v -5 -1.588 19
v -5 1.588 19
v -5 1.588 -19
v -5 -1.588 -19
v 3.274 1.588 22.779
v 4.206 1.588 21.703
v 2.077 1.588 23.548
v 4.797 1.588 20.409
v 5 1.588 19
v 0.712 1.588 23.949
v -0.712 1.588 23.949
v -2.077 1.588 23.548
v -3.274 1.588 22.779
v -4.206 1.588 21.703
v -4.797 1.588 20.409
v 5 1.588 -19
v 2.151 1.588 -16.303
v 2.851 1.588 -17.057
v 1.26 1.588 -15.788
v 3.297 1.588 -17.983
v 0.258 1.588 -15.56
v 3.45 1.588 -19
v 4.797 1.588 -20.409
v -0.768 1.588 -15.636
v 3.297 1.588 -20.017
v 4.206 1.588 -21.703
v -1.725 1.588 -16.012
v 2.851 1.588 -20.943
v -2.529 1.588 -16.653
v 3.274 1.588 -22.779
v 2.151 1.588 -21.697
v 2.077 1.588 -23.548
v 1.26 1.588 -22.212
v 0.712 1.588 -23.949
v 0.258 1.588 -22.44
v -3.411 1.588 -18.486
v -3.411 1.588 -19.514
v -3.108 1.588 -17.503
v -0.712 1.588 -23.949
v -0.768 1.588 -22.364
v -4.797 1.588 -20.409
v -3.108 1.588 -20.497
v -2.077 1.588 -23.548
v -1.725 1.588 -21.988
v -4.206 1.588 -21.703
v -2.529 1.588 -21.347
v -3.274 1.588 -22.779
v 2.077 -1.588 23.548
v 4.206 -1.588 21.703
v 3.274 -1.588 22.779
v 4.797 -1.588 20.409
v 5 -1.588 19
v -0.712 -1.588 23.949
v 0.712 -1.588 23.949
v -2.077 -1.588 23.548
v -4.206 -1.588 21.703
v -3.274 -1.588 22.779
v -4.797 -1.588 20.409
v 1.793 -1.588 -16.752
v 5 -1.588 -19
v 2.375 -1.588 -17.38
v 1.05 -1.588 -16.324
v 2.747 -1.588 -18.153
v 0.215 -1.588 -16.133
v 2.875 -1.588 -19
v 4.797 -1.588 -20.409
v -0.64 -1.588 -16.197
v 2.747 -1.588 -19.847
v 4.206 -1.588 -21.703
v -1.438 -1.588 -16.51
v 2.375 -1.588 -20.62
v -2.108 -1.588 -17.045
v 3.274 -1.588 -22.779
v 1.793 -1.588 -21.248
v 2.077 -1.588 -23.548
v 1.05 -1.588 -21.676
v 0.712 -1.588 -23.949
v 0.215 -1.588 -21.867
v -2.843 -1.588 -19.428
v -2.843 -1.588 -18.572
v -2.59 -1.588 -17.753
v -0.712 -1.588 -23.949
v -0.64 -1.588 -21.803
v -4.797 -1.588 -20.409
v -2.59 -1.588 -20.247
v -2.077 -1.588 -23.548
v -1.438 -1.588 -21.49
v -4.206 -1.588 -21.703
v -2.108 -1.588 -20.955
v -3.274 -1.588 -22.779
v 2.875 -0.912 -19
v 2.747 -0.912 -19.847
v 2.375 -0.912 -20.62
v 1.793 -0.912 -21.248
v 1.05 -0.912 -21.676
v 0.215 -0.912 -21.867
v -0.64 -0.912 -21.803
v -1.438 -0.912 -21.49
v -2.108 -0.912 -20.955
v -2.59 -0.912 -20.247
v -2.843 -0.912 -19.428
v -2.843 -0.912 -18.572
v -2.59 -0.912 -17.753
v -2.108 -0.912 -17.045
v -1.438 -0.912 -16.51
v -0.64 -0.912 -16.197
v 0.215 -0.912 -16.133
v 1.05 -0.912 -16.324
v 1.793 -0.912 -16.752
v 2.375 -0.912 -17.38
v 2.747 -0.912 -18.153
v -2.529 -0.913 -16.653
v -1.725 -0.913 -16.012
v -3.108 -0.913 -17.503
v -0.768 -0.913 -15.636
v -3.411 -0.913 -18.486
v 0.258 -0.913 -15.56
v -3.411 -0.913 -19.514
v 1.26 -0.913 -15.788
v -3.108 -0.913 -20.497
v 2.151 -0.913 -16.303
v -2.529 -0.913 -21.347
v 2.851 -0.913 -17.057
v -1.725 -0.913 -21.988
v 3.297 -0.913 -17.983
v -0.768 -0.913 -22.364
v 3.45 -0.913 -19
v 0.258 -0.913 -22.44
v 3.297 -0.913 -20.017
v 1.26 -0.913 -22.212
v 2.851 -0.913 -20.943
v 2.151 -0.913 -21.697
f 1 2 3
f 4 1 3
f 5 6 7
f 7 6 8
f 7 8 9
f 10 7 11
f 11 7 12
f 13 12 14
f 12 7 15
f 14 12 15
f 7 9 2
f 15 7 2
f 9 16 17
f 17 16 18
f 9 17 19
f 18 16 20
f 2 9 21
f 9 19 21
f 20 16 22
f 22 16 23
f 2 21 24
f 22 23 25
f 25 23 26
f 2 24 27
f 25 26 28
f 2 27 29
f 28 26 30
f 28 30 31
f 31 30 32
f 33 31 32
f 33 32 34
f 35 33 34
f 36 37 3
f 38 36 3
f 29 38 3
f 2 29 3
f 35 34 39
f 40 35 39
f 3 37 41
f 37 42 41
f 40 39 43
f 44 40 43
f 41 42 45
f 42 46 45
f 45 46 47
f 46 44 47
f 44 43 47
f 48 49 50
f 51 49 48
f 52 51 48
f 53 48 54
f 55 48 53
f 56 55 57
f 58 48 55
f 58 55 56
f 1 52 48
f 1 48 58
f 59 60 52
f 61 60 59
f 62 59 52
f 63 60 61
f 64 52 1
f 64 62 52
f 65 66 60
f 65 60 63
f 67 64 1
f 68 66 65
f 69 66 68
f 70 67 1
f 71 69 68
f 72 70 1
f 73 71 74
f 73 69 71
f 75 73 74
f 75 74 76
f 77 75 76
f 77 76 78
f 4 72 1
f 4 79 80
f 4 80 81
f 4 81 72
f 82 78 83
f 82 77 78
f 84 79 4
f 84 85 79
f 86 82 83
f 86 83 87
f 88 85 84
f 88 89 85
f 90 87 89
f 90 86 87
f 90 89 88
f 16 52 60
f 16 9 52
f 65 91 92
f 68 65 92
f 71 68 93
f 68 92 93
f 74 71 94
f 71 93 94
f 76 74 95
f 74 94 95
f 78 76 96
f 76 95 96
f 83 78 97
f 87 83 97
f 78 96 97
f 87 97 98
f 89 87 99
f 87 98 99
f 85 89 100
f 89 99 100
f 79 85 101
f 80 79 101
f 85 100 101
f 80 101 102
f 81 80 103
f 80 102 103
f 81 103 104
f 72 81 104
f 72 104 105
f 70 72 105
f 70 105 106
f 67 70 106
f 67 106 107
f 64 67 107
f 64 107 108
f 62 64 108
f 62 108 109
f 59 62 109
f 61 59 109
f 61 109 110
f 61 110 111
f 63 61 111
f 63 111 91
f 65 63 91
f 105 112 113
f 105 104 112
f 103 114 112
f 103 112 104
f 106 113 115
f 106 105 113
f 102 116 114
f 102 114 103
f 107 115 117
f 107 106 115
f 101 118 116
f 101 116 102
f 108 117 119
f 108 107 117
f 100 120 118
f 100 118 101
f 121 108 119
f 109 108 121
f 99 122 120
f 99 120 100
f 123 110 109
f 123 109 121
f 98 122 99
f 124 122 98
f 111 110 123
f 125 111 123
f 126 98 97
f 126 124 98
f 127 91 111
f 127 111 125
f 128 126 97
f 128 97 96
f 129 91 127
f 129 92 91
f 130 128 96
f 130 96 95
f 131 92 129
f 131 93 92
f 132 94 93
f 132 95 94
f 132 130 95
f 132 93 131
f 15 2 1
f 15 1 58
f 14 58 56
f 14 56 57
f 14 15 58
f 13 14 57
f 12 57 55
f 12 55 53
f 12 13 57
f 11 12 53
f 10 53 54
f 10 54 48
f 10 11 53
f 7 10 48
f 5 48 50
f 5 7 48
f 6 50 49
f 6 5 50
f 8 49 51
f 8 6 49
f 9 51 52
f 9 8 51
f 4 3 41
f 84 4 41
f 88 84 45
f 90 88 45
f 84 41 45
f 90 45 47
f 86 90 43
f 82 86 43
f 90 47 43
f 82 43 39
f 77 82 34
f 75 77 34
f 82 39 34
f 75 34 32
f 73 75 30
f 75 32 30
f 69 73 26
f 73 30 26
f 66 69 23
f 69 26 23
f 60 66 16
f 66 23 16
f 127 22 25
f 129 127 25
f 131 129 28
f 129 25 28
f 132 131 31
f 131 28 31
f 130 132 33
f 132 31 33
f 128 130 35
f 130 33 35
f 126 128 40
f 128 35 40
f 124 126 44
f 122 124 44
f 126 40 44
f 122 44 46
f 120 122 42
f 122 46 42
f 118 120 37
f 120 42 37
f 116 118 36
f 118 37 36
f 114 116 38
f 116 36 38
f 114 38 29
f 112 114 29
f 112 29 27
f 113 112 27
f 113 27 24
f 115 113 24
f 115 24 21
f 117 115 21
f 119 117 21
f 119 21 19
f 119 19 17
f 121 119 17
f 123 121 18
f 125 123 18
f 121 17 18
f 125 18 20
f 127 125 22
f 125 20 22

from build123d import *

# Parameters (mm, degrees)
SKETCH1_W           = 10
SKETCH1_H           = 38
BOSS_EXTRUDE1_DEPTH = 1.5875
SKETCH2_R           = 3.45
CUT_EXTRUDE1_DEPTH  = 2.5
SKETCH3_R           = 2.875
CUT_EXTRUDE2_DEPTH  = 1.675


with BuildPart() as part:
    # Sketch1 → Boss-Extrude1 (new body, symmetric)
    with BuildSketch(Plane(origin=(0, 0, 0), x_dir=(1, 0, 0), z_dir=(0, 1, 0))):
        with BuildLine():
            ThreePointArc((-5, 19), (0, 24), (5, 19))
            Line((5, 19), (-5, 19))
        make_face()
        Rectangle(SKETCH1_W, SKETCH1_H)
        with BuildLine():
            Line((5, -19), (-5, -19))
            ThreePointArc((-5, -19), (0, -24), (5, -19))
        make_face()
    extrude(amount=BOSS_EXTRUDE1_DEPTH, both=True)

    # Sketch2 → Cut-Extrude1 (cut)
    with BuildSketch(Plane(origin=(0, 1.5875, 0), x_dir=(1, 0, 0), z_dir=(0, 1, 0))):
        with Locations((0, 19)):
            Circle(SKETCH2_R)
    extrude(amount=-CUT_EXTRUDE1_DEPTH, mode=Mode.SUBTRACT)

    # Sketch3 → Cut-Extrude2 (cut, through all)
    with BuildSketch(Plane(origin=(0, -0.9125, 0), x_dir=(1, 0, 0), z_dir=(0, 1, 0))):
        with Locations((0, 19)):
            Circle(SKETCH3_R)
    extrude(amount=-CUT_EXTRUDE2_DEPTH, mode=Mode.SUBTRACT)


solid = part.part
